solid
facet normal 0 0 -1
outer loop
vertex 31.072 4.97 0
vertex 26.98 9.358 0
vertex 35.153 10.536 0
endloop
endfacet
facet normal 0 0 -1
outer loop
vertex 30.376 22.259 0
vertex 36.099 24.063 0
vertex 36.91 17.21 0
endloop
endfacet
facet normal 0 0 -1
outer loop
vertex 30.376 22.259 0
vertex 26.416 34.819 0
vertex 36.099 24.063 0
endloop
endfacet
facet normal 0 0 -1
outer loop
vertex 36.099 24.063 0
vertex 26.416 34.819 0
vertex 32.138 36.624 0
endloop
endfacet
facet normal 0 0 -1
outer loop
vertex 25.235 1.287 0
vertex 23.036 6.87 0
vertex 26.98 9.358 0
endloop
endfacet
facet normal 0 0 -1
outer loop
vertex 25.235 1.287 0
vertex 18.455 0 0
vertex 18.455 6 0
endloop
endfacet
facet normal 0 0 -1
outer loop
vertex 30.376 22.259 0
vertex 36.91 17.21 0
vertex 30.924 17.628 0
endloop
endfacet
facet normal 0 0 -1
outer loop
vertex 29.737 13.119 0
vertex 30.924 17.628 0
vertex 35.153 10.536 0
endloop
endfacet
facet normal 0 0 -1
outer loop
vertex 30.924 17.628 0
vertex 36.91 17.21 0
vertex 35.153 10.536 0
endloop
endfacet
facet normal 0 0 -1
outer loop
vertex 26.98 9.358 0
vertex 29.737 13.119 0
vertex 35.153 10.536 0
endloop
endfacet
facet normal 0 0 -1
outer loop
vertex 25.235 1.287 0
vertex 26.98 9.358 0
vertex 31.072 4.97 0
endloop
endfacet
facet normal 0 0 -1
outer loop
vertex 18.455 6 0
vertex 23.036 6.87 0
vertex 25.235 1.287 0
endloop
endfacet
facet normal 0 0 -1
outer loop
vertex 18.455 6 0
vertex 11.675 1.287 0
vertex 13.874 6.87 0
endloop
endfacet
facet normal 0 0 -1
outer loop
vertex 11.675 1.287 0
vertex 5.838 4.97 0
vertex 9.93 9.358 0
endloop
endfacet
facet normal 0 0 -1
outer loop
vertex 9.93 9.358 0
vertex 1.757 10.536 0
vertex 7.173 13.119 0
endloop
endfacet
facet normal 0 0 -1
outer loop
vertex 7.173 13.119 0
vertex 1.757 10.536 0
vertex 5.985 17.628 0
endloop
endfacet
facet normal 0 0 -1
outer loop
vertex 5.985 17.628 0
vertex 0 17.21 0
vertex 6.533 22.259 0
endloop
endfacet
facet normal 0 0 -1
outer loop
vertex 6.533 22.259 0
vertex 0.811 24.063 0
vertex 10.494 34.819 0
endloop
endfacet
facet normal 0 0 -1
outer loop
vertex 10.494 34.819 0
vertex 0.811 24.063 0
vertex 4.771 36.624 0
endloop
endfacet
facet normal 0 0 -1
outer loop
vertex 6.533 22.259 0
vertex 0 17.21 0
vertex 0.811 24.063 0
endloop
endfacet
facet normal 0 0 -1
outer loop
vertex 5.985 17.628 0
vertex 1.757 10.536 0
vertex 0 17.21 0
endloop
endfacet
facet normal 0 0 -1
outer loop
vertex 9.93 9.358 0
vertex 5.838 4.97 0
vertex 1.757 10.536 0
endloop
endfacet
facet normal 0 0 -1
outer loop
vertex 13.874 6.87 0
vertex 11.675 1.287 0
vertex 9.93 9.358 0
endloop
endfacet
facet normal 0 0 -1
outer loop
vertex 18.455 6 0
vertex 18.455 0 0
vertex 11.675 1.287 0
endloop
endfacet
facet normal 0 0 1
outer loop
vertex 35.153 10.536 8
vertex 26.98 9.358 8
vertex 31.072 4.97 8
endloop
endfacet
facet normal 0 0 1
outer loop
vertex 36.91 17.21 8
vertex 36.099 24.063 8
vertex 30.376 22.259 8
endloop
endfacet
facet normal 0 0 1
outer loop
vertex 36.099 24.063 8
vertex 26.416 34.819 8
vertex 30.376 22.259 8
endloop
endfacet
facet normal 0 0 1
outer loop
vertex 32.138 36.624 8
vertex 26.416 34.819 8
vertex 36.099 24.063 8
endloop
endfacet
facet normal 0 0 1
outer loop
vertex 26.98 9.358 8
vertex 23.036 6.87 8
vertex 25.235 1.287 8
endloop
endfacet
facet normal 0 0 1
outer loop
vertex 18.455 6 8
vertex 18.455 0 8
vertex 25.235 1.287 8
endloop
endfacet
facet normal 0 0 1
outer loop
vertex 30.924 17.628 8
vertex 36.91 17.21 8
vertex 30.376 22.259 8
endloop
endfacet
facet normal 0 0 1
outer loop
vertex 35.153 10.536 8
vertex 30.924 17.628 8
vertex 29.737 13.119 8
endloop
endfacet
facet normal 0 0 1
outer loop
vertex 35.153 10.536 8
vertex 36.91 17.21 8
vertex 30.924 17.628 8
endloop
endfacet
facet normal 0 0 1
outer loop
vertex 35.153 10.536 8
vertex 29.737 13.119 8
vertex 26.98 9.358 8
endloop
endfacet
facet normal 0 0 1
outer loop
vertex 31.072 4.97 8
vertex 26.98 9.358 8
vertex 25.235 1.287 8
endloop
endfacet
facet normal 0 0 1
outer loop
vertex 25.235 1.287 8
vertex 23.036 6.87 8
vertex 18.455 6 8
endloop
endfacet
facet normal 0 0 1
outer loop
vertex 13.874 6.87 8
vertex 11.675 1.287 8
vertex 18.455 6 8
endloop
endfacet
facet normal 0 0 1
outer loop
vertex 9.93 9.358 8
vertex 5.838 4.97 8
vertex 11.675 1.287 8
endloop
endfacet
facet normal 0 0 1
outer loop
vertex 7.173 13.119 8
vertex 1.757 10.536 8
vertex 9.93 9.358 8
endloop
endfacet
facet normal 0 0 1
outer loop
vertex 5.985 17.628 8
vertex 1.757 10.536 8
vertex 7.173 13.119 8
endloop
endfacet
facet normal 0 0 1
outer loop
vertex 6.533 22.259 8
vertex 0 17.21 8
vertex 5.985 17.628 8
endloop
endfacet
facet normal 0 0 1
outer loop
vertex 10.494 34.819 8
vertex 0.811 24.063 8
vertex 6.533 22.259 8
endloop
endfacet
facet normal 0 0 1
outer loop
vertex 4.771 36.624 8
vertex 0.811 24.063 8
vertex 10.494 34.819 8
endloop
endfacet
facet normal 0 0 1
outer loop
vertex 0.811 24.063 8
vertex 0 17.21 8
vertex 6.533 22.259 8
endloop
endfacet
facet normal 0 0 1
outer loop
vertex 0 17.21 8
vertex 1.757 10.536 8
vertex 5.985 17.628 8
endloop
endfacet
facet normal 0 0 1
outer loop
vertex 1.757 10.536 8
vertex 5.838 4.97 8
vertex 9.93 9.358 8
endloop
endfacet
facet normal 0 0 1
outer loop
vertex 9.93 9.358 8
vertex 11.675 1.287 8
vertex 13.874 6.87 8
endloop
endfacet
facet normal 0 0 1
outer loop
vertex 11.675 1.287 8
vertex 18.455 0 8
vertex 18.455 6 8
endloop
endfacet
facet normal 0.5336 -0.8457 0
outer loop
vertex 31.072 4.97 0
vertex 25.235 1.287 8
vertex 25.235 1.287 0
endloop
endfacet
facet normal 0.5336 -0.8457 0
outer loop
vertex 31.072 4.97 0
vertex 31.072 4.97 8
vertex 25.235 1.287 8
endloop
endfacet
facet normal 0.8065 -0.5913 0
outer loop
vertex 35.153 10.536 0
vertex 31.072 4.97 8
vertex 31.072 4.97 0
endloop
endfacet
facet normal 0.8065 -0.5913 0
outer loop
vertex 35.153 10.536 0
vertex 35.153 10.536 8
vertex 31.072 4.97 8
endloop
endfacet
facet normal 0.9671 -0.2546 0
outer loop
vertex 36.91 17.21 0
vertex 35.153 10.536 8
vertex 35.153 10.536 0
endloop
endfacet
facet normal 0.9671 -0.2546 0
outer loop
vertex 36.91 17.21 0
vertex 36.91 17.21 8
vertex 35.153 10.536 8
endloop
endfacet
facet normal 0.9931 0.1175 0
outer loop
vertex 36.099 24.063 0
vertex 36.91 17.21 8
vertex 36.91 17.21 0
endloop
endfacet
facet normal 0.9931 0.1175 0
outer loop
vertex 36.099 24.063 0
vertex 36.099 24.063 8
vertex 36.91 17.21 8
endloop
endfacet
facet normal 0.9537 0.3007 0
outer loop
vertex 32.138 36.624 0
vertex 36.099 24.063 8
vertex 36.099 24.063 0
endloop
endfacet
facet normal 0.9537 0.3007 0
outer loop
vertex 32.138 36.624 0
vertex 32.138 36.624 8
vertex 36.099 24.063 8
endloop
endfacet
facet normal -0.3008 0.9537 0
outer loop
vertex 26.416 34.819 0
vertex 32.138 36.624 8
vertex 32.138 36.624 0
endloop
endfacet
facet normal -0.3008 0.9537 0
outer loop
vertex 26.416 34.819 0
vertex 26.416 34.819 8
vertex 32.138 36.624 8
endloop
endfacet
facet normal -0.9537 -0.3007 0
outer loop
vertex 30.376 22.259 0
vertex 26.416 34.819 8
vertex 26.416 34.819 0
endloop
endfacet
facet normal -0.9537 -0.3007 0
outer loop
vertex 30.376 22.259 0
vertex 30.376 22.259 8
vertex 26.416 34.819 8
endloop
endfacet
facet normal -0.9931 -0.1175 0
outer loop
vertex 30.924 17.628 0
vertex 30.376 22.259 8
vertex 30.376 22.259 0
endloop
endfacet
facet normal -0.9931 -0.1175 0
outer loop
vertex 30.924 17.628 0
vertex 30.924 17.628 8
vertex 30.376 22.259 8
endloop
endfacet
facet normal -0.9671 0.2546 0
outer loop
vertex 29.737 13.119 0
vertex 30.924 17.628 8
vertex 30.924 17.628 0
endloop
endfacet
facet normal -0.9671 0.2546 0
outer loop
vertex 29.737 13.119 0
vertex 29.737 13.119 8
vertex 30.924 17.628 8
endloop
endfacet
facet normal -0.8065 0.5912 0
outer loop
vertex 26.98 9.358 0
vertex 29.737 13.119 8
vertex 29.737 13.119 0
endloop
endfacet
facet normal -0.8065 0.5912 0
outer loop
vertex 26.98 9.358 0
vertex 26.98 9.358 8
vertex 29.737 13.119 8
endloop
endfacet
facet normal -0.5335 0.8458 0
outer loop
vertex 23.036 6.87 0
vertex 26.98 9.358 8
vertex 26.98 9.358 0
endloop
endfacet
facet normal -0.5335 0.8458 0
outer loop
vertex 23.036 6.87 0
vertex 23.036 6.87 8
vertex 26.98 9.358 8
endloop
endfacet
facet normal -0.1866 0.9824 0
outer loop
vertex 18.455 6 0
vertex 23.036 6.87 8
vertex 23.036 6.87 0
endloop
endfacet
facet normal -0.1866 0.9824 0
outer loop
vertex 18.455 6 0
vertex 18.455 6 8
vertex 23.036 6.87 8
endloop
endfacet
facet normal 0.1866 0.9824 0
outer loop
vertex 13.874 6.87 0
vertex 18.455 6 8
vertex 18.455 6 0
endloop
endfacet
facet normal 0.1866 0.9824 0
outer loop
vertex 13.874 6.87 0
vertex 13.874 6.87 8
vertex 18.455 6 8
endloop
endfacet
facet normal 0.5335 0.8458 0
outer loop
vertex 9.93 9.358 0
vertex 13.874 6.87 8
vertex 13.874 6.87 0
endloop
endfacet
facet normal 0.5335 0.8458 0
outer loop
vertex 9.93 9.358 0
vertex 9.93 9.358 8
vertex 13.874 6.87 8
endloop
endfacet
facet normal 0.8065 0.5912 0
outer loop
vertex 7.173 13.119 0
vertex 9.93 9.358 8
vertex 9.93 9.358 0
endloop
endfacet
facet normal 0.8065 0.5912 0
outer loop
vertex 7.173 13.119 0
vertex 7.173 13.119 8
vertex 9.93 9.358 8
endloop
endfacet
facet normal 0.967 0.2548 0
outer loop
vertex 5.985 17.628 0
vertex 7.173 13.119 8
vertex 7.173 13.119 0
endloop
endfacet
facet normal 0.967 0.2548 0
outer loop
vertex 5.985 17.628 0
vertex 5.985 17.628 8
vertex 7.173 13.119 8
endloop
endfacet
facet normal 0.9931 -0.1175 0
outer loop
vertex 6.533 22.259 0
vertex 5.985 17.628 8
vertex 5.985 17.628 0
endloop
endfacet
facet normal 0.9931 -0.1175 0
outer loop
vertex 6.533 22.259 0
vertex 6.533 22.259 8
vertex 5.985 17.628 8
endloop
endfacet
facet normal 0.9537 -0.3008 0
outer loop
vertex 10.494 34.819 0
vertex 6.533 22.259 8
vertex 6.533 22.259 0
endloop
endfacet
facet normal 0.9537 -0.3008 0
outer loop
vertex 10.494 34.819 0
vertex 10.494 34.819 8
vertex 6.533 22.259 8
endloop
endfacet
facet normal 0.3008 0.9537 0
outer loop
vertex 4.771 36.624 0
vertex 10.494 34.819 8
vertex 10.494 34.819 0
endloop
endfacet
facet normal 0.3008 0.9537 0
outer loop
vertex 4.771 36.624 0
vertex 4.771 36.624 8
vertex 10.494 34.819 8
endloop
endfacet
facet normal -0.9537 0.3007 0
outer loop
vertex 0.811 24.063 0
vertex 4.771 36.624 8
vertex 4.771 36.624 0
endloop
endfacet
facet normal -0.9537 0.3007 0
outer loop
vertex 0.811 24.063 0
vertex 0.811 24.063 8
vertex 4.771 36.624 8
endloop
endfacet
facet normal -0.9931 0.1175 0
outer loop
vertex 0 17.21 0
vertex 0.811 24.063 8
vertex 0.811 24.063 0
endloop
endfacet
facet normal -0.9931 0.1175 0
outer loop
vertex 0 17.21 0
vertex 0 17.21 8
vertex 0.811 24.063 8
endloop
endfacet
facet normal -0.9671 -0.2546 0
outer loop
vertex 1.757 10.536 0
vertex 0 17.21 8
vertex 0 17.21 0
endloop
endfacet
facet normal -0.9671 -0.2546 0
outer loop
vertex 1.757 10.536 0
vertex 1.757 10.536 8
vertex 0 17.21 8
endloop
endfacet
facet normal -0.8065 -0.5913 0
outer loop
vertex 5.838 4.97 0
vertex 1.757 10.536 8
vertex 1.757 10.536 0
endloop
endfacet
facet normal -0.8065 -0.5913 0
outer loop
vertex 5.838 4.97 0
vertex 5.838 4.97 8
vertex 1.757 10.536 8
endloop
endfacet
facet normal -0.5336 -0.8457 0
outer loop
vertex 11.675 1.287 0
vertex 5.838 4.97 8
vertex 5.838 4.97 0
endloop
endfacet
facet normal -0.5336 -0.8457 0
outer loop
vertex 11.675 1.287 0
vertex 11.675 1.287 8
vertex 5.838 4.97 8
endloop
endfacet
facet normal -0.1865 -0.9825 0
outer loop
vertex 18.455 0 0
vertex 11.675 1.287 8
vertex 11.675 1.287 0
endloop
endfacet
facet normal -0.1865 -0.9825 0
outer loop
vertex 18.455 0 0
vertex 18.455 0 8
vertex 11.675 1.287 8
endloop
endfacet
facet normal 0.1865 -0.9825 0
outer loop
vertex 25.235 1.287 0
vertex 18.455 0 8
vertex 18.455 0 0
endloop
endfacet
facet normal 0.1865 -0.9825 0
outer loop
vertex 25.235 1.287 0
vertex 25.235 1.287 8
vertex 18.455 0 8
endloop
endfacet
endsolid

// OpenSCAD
$fn = 32;

// ----------------------------------------------------------------------
// Clip blank: omega clip, 8 mm thick
// ----------------------------------------------------------------------

// --- parameters (mm) ---
profile_height = 8;       // extrusion height
profile_points = 26;      // points of the closed outline

profile = [[0.811, 24.063], [0, 17.21], [1.757, 10.536], [5.838, 4.97], [11.675, 1.287], [18.455, 0], [25.235, 1.287], [31.072, 4.97], [35.153, 10.536], [36.91, 17.21], [36.099, 24.063], [32.138, 36.624], [26.416, 34.819], [30.376, 22.259], [30.924, 17.628], [29.737, 13.119], [26.98, 9.358], [23.036, 6.87], [18.455, 6], [13.874, 6.87], [9.93, 9.358], [7.173, 13.119], [5.985, 17.628], [6.533, 22.259], [10.494, 34.819], [4.771, 36.624]];  // single closed polygon, 26 points, counter clockwise

// --- the one profile operation ---
linear_extrude(height = profile_height) polygon(points = profile);
